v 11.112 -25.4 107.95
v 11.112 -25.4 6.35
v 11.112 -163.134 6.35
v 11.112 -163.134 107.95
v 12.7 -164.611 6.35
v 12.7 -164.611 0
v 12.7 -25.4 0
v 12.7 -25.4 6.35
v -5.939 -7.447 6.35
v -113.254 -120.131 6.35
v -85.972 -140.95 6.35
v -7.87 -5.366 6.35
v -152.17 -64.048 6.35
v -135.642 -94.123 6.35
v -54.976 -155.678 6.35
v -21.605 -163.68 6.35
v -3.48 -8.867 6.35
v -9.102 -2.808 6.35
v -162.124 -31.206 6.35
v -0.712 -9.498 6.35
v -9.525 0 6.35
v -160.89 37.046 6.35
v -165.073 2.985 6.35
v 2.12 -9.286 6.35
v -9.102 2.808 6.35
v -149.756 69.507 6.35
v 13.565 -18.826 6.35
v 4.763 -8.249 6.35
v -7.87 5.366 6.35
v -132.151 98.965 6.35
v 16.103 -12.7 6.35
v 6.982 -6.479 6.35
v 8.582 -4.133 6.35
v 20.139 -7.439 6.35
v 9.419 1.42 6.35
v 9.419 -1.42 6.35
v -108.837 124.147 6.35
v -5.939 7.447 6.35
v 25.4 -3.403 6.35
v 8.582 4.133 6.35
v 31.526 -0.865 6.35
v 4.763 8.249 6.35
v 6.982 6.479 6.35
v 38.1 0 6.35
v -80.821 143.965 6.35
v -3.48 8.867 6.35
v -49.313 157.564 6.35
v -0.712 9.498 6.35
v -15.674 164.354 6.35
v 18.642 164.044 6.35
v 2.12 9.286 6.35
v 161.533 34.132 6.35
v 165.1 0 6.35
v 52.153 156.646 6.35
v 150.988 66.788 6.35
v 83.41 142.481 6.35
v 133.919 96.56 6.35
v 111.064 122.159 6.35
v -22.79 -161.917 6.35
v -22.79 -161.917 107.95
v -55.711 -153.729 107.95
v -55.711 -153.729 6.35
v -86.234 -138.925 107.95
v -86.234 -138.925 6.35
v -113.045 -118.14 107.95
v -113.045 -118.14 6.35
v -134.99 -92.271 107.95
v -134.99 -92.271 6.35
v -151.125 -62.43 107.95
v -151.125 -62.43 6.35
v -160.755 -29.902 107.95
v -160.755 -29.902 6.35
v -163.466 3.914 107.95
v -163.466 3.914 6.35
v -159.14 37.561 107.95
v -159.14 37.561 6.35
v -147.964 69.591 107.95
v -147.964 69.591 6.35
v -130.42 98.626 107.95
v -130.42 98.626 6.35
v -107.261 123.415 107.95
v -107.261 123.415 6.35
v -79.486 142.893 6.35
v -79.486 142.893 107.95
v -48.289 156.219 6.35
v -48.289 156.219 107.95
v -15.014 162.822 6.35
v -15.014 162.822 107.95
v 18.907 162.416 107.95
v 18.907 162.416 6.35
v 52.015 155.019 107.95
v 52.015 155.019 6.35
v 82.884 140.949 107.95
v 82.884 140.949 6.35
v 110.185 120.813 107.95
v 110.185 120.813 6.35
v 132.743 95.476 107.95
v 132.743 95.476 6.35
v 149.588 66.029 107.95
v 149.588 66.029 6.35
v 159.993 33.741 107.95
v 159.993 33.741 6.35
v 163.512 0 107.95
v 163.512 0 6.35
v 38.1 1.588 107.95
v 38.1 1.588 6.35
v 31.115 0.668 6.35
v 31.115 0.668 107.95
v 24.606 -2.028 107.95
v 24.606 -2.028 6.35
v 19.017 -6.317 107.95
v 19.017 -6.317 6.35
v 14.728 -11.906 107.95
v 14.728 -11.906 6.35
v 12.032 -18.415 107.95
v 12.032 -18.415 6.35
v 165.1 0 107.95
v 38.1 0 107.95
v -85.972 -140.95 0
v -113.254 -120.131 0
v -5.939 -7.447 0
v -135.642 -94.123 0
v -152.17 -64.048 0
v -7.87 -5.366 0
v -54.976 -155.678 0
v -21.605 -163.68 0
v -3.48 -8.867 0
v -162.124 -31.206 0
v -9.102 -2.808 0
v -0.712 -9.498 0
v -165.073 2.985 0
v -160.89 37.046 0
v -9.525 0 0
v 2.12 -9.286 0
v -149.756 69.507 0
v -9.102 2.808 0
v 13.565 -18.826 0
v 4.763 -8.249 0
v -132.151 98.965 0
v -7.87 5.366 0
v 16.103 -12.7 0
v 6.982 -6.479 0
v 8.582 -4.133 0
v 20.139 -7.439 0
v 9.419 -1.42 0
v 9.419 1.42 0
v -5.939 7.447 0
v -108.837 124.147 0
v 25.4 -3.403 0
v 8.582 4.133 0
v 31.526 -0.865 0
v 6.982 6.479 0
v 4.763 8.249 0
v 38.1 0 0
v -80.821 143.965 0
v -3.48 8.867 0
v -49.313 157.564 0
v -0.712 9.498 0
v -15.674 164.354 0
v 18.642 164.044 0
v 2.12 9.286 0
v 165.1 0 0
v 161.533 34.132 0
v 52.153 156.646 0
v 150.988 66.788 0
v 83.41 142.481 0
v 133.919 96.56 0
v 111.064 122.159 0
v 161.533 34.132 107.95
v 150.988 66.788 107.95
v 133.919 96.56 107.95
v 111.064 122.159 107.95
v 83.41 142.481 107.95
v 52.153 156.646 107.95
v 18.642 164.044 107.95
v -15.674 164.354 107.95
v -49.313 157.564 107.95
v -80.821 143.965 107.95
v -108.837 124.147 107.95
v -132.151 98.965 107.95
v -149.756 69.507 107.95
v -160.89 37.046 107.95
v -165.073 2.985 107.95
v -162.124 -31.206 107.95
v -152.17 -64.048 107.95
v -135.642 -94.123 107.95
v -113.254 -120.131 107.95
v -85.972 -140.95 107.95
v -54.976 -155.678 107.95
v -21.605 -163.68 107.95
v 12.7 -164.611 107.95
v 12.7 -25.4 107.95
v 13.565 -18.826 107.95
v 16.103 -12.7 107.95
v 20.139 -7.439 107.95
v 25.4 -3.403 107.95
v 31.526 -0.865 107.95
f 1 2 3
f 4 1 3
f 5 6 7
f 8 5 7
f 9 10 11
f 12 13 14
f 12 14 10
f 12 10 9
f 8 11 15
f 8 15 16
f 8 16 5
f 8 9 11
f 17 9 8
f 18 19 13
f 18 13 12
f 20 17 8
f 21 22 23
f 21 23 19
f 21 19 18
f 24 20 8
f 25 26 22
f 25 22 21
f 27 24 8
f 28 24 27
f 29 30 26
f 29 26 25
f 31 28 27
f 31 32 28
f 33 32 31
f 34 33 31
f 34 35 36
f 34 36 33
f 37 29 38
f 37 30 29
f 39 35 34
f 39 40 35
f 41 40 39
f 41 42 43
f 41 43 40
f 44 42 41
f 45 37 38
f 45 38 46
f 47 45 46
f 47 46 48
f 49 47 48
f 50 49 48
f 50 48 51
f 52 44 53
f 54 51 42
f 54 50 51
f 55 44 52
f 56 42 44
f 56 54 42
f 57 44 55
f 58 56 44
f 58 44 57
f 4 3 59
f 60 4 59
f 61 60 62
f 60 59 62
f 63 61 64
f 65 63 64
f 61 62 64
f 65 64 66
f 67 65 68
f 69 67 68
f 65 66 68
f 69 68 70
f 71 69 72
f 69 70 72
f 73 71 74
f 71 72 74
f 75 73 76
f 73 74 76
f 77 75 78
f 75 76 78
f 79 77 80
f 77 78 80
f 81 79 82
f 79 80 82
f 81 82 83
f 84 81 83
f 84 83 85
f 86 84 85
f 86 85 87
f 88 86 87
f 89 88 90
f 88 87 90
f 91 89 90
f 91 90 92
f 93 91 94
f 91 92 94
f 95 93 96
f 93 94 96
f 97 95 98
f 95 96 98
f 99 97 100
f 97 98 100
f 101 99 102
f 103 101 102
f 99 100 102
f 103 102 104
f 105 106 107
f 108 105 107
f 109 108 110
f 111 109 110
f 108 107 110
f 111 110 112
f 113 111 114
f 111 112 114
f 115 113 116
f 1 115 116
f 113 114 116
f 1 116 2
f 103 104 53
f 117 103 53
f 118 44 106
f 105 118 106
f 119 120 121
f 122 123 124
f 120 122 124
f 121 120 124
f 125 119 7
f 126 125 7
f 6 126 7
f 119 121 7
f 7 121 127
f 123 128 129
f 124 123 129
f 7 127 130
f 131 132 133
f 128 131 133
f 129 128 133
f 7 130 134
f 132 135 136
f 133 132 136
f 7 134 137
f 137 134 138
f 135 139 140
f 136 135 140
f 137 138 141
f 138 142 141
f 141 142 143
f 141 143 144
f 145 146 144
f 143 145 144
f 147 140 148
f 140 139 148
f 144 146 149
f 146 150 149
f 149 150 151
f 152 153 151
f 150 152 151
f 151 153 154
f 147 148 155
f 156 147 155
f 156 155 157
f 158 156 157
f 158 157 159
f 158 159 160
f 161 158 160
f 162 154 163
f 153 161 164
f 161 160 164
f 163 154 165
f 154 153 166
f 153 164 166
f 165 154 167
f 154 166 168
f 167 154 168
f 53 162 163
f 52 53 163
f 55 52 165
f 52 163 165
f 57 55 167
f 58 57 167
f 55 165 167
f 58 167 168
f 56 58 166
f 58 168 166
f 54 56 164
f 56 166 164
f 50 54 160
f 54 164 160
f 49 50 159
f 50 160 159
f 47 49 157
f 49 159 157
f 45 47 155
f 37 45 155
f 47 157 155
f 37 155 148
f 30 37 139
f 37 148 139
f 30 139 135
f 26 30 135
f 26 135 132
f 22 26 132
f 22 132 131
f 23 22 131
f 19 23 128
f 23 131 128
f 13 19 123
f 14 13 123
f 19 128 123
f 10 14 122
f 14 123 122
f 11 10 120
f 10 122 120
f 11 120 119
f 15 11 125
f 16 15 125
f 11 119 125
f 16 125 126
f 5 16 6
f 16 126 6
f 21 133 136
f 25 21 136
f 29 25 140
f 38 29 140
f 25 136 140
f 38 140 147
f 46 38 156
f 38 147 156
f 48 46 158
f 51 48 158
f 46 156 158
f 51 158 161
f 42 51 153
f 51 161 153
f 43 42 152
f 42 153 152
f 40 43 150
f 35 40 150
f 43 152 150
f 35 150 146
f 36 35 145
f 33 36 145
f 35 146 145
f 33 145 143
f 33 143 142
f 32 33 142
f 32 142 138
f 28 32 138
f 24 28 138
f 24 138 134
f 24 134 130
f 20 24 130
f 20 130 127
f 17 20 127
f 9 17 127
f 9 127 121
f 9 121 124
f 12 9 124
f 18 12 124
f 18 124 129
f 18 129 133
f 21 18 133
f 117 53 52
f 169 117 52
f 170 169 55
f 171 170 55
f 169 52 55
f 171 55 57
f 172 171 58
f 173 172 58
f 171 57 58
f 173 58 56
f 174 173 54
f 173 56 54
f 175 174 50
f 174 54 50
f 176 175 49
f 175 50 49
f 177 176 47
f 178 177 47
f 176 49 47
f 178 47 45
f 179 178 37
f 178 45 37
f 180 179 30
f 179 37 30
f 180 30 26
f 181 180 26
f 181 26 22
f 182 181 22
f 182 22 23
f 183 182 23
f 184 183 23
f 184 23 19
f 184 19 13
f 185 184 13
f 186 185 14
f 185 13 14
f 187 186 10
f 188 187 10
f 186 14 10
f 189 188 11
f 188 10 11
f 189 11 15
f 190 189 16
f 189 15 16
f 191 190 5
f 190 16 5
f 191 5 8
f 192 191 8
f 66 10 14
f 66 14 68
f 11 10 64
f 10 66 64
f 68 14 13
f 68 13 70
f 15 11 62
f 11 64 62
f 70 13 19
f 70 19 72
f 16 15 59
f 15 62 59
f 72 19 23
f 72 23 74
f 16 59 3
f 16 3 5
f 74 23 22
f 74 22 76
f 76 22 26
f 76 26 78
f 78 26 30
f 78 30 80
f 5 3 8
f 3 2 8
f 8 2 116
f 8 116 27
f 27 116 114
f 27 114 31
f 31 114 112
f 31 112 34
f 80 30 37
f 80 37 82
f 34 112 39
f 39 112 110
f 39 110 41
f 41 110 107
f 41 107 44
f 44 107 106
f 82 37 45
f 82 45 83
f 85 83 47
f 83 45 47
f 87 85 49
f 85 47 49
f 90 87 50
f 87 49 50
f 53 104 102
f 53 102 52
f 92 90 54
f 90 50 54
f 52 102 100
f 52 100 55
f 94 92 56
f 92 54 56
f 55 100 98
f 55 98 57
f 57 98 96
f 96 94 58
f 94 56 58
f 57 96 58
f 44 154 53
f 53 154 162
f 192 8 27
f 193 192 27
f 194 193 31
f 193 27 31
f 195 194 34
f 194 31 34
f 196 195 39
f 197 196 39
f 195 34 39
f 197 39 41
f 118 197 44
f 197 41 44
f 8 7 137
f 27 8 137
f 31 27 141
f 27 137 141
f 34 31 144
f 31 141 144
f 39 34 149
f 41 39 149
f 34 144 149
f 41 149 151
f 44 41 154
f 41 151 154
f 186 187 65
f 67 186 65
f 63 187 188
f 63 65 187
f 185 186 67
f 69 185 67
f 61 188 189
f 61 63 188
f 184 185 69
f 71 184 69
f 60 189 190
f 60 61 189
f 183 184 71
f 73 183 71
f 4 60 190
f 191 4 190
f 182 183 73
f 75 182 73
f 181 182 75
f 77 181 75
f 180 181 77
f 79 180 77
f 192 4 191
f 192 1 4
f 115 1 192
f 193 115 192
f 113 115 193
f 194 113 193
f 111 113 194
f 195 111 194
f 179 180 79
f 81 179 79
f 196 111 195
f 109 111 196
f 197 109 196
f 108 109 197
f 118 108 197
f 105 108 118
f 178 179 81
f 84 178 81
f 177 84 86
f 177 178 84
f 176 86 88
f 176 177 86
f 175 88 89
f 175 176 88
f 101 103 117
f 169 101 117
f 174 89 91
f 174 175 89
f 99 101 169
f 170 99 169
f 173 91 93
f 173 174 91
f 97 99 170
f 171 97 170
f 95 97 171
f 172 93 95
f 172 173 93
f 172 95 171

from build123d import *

# Parameters (mm, degrees)
F1_DEPTH = 6.35
F3_DEPTH = 101.6
F5_D     = 19.05


with BuildPart() as f1:
    # F0 (on Top) → F1 (new body)
    with BuildSketch(Plane.XY):
        with BuildLine():
            Line((38.1, 0), (165.1, 0))
            ThreePointArc((165.1, 0), (-121.150279, 112.163363), (12.7, -164.610814))
            Line((12.7, -164.610814), (12.7, -25.4))
            ThreePointArc((12.7, -25.4), (20.139488, -7.439488), (38.1, 0))
        make_face()
    extrude(amount=F1_DEPTH)

    # F5 (through all)
    with Locations(Plane.XY.offset(6.35)):
        with Locations((0, 0)):
            Hole(F5_D / 2)


with BuildPart() as f3:
    # F2 (on face) → F3 (new body)
    with BuildSketch(Plane.XY.offset(6.35)):
        with BuildLine():
            Line((38.1, 0), (38.1, 1.5875))
            ThreePointArc((38.1, 1.5875), (19.016956, -6.316956), (11.1125, -25.4))
            Line((11.1125, -25.4), (11.1125, -163.134454))
            ThreePointArc((11.1125, -163.134454), (-119.485083, 111.622814), (163.5125, 0))
            Line((163.5125, 0), (165.1, 0))
            ThreePointArc((165.1, 0), (-121.150279, 112.163363), (12.7, -164.610814))
            Line((12.7, -164.610814), (12.7, -25.4))
            ThreePointArc((12.7, -25.4), (20.139488, -7.439488), (38.1, 0))
        make_face()
    extrude(amount=F3_DEPTH)


solid = Compound([f1.part, f3.part])
